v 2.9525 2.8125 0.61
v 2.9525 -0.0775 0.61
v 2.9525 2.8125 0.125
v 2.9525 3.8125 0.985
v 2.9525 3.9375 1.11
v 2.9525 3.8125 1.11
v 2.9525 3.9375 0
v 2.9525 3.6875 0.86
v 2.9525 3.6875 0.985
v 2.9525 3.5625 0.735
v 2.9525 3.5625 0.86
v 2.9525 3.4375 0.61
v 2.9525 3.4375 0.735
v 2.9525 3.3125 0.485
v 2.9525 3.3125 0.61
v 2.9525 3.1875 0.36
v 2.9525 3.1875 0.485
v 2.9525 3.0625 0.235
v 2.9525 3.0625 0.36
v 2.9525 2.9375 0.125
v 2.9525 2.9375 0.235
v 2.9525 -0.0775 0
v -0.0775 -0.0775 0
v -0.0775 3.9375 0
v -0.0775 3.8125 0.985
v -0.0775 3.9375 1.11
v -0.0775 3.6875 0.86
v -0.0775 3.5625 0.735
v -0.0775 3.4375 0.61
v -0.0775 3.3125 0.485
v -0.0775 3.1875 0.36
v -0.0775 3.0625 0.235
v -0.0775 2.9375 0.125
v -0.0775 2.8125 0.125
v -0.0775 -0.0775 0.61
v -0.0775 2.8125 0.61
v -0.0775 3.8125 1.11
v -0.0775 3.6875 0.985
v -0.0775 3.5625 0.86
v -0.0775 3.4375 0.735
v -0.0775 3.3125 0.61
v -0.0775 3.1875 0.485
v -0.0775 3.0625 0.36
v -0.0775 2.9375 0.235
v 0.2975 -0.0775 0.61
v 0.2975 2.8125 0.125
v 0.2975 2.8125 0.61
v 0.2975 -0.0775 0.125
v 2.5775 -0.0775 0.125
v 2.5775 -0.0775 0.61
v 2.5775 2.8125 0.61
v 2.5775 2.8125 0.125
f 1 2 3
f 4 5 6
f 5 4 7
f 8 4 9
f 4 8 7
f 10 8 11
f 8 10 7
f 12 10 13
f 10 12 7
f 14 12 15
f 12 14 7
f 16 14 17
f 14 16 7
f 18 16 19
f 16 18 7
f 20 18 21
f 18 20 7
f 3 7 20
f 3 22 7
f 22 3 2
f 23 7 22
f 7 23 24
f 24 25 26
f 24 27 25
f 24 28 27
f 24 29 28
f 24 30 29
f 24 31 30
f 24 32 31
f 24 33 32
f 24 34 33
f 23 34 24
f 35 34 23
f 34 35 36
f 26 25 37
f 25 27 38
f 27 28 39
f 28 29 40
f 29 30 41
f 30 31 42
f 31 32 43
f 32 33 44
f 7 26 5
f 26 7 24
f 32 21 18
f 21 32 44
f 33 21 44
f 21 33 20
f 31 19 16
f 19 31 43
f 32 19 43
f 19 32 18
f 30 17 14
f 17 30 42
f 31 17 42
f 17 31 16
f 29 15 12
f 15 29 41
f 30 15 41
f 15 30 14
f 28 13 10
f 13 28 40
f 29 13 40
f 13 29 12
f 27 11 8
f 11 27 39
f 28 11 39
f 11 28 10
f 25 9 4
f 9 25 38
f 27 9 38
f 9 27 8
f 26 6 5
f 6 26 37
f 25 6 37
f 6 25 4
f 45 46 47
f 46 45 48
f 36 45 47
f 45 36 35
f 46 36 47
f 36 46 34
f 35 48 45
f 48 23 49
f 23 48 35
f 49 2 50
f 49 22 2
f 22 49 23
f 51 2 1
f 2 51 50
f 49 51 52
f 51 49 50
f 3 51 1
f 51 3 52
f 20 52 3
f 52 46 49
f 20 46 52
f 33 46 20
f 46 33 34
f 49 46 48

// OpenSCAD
// file: sub_base_plate.scad
// sub_base_plate.scad — shared tile-building blocks: plate, rivets, edge ID marks,
// and the common plate/hole dimensional constants used by every tile.
// Units: inches
//
// Usage — must be `include`, not `use`, and the include line must come
// before any code in the caller that references plate_w/plate_d/plate_h/
// frame_w/hole_d/hole_r: a variable defined only inside an included file is
// invisible to code positioned before the include statement.
//   include <sub_base_plate.scad>
//   plate(["red", undef, "blue", undef, undef, "green"]);
//
// plate(colors) is the main entry point: it builds the complete base tile in
// one call — the frame with edge ID marks, the darkgray plate, and the
// lightgray rivet ring (40 rivets, 10 per side, corners shared). colors is the
// same 6-slot frame_with_id() array described below.
//
// frame_with_id() colors are applied left-to-right (−x to +x), repeated
// identically on all four edges. Bottom and right edges read the array in
// reverse (slot 5-i) so the pattern stays consistent when the tile is flipped.
// Any position left as undef or omitted defaults to black. 8 segments span the
// straight run of each edge (corners always stay solid black); segment 1 (the
// leftmost/first segment of each edge) is always darkgray and segment 8 (the
// last) is always black — both ignore the colors array. The remaining 6
// segments (2-7) read colors[0..5]. Each mark is
// sandwiched between a thin black id_cover layer on the bottom and another on
// top; marks are visible only from the edge, not from the top or bottom face.

plate_w = 2 + 7/8;
plate_d = 2 + 7/8;
plate_h = 1/8; // full plate thickness
frame_w = 1/16;
hole_d  = 3/32;
hole_r  = hole_d / 2;

pattern_h = 1/32;  // thickness of the raised pattern on the top surface of the plate, for example
                   // the belt pattern or the gear teeth. This is a separate constant
                   // from plate_h so that the pattern can be printed in a different
                   // color than the plate itself.
id_cover = plate_h * 3 / 16;

module rivet_holes() {
    spacing_x = plate_w / 10;
    spacing_y = plate_d / 10;
    inset_x   = spacing_x / 2;
    inset_y   = spacing_y / 2;
    for (i = [0:9]) translate([inset_x + i * spacing_x, inset_y,           -1]) cylinder(h = plate_h + 2, r = hole_r, $fn = 20);
    for (i = [0:9]) translate([inset_x + i * spacing_x, plate_d - inset_y, -1]) cylinder(h = plate_h + 2, r = hole_r, $fn = 20);
    for (i = [0:9]) translate([inset_x,           inset_y + i * spacing_y, -1]) cylinder(h = plate_h + 2, r = hole_r, $fn = 20);
    for (i = [0:9]) translate([plate_w - inset_x, inset_y + i * spacing_y, -1]) cylinder(h = plate_h + 2, r = hole_r, $fn = 20);
}

module rivets() {
    spacing_x = plate_w / 10;
    spacing_y = plate_d / 10;
    inset_x   = spacing_x / 2;
    inset_y   = spacing_y / 2;
    color("lightgray") {
        for (i = [0:9]) translate([inset_x + i * spacing_x, inset_y,           0]) cylinder(h = plate_h, r = hole_r, $fn = 20);
        for (i = [0:9]) translate([inset_x + i * spacing_x, plate_d - inset_y, 0]) cylinder(h = plate_h, r = hole_r, $fn = 20);
        for (i = [0:9]) translate([inset_x,           inset_y + i * spacing_y, 0]) cylinder(h = plate_h, r = hole_r, $fn = 20);
        for (i = [0:9]) translate([plate_w - inset_x, inset_y + i * spacing_y, 0]) cylinder(h = plate_h, r = hole_r, $fn = 20);
    }
}

module frame_with_id(colors = []) {
    region_w = plate_w / 8;
    region_d = plate_d / 8;
    mark_h   = plate_h - 2 * id_cover;

    color("black")
    difference() {
        translate([-frame_w, -frame_w, 0])
            cube([plate_w + 2 * frame_w, plate_d + 2 * frame_w, plate_h]);
        translate([0, 0, -0.001])
            cube([plate_w, plate_d, plate_h + 0.002]);
        // top/bottom/left/right straight runs only — corners stay solid black
        translate([0, plate_d - 0.001, -0.001])
            cube([plate_w, frame_w + 0.002, plate_h + 0.002]);
        translate([0, -frame_w - 0.001, -0.001])
            cube([plate_w, frame_w + 0.002, plate_h + 0.002]);
        translate([-frame_w - 0.001, 0, -0.001])
            cube([frame_w + 0.002, plate_d, plate_h + 0.002]);
        translate([plate_w - 0.001, 0, -0.001])
            cube([frame_w + 0.002, plate_d, plate_h + 0.002]);
    }

    for (i = [0:7]) {
        c     = (i == 0) ? "darkgray" : (i == 7) ? "black" : ((colors[i-1] != undef) ? colors[i-1] : "black");

        // top edge — id_cover, mark, id_cover
        color("black") translate([i * region_w, plate_d, 0]) cube([region_w, frame_w, id_cover]);
        color(c)       translate([i * region_w, plate_d, id_cover]) cube([region_w, frame_w, mark_h]);
        color("black") translate([i * region_w, plate_d, id_cover + mark_h]) cube([region_w, frame_w, id_cover]);

        // bottom edge (reversed) — id_cover, mark, id_cover
        color("black") translate([(7-i) * region_w, -frame_w, 0]) cube([region_w, frame_w, id_cover]);
        color(c)       translate([(7-i) * region_w, -frame_w, id_cover]) cube([region_w, frame_w, mark_h]);
        color("black") translate([(7-i) * region_w, -frame_w, id_cover + mark_h]) cube([region_w, frame_w, id_cover]);

        // left edge — id_cover, mark, id_cover
        color("black") translate([-frame_w, i * region_d, 0]) cube([frame_w, region_d, id_cover]);
        color(c)       translate([-frame_w, i * region_d, id_cover]) cube([frame_w, region_d, mark_h]);
        color("black") translate([-frame_w, i * region_d, id_cover + mark_h]) cube([frame_w, region_d, id_cover]);

        // right edge (reversed) — id_cover, mark, id_cover
        color("black") translate([plate_w, (7-i) * region_d, 0]) cube([frame_w, region_d, id_cover]);
        color(c)       translate([plate_w, (7-i) * region_d, id_cover]) cube([frame_w, region_d, mark_h]);
        color("black") translate([plate_w, (7-i) * region_d, id_cover + mark_h]) cube([frame_w, region_d, id_cover]);
    }
}

module plate(colors = []) {
    frame_with_id(colors);
    union() {
        difference() {
            color("darkgray") cube([plate_w, plate_d, plate_h]);
            rivet_holes();
        }
        rivets();
    }
}
// main file
// wall-base.scad
// Support base that holds a stack of 9 Element200 wall tiles, each flipped
// upside down (wall hanging down). Every tile sits directly on the one below
// it, shifted +Y by one wall thickness so its wall hangs just outside the
// previous tile's edge. A staircase under the walls supports each wall.
// Units: inches

include <sub_base_plate.scad>

// Tile geometry (must match element200-u.scad)
wall_h     = plate_h + 1/2;   // total wall height measured from plate bottom
wall_thick = 1/8;
wall_y     = plate_d - frame_w;
tile_w     = plate_w + 2 * frame_w;   // 3.0"
tile_y0    = -frame_w;                // front edge of a tile

// Base parameters
num_tiles  = 9;
clr        = 0.015;       // clearance between tile and base surfaces
floor_t    = 1/8;         // floor thickness
ledge_w    = 3/8;         // inward shelf under tile 1's plate
step_y     = wall_thick;  // Y shift between consecutive tiles
show_tiles = false;       // preview ghost tiles

wall_drop  = wall_h - plate_h;                 // how far a wall hangs below its plate
z0         = floor_t + wall_drop;              // plate bottom of tile 1
function tile_z(k) = z0 + k * plate_h;         // plate bottom of tile k
function tile_yoff(k) = k * step_y;

cav_w      = tile_w + 2 * clr;                 // base width: tile width plus clearance
base_w     = cav_w;
y_front    = tile_y0 - clr;
y_end      = tile_yoff(num_tiles - 1) + wall_y + wall_thick;
base_x0    = -frame_w - clr;

module floor_plate() {
    translate([base_x0, y_front, 0])
        cube([base_w, y_end - y_front, floor_t]);
}

// One step per wall: step k rises to the underside of wall k and extends to the rear
module wall_steps() {
    for (k = [0:num_tiles-1]) {
        y = tile_yoff(k) + wall_y;
        translate([-frame_w - clr, y, 0])
            cube([cav_w, y_end - y, tile_z(k) - wall_drop - clr]);
    }
}

// Shelves carrying the plate edges of tile 1 in front of its wall
module ledges() {
    for (x = [-frame_w - clr, -frame_w - clr + cav_w - ledge_w])
        translate([x, y_front, 0])
            cube([ledge_w, wall_y + tile_yoff(0) - y_front, z0 - clr]);
}

module wall_base() {
    color("dimgray") union() {
        floor_plate();
        wall_steps();
        ledges();
    }
}

// Placeholder tile (flipped about Y so the wall stays on the +Y edge)
module ghost_tile(k) {
    translate([plate_w + frame_w, tile_yoff(k), tile_z(k) + plate_h])
        rotate([0, 180, 0]) {
            color("gray", 0.5) translate([-frame_w, -frame_w, 0]) cube([tile_w, tile_w, plate_h]);
            color("firebrick", 0.7) translate([-frame_w, wall_y, 0]) cube([tile_w, wall_thick, wall_h]);
        }
}

wall_base();
if (show_tiles) for (k = [0:num_tiles-1]) ghost_tile(k);
